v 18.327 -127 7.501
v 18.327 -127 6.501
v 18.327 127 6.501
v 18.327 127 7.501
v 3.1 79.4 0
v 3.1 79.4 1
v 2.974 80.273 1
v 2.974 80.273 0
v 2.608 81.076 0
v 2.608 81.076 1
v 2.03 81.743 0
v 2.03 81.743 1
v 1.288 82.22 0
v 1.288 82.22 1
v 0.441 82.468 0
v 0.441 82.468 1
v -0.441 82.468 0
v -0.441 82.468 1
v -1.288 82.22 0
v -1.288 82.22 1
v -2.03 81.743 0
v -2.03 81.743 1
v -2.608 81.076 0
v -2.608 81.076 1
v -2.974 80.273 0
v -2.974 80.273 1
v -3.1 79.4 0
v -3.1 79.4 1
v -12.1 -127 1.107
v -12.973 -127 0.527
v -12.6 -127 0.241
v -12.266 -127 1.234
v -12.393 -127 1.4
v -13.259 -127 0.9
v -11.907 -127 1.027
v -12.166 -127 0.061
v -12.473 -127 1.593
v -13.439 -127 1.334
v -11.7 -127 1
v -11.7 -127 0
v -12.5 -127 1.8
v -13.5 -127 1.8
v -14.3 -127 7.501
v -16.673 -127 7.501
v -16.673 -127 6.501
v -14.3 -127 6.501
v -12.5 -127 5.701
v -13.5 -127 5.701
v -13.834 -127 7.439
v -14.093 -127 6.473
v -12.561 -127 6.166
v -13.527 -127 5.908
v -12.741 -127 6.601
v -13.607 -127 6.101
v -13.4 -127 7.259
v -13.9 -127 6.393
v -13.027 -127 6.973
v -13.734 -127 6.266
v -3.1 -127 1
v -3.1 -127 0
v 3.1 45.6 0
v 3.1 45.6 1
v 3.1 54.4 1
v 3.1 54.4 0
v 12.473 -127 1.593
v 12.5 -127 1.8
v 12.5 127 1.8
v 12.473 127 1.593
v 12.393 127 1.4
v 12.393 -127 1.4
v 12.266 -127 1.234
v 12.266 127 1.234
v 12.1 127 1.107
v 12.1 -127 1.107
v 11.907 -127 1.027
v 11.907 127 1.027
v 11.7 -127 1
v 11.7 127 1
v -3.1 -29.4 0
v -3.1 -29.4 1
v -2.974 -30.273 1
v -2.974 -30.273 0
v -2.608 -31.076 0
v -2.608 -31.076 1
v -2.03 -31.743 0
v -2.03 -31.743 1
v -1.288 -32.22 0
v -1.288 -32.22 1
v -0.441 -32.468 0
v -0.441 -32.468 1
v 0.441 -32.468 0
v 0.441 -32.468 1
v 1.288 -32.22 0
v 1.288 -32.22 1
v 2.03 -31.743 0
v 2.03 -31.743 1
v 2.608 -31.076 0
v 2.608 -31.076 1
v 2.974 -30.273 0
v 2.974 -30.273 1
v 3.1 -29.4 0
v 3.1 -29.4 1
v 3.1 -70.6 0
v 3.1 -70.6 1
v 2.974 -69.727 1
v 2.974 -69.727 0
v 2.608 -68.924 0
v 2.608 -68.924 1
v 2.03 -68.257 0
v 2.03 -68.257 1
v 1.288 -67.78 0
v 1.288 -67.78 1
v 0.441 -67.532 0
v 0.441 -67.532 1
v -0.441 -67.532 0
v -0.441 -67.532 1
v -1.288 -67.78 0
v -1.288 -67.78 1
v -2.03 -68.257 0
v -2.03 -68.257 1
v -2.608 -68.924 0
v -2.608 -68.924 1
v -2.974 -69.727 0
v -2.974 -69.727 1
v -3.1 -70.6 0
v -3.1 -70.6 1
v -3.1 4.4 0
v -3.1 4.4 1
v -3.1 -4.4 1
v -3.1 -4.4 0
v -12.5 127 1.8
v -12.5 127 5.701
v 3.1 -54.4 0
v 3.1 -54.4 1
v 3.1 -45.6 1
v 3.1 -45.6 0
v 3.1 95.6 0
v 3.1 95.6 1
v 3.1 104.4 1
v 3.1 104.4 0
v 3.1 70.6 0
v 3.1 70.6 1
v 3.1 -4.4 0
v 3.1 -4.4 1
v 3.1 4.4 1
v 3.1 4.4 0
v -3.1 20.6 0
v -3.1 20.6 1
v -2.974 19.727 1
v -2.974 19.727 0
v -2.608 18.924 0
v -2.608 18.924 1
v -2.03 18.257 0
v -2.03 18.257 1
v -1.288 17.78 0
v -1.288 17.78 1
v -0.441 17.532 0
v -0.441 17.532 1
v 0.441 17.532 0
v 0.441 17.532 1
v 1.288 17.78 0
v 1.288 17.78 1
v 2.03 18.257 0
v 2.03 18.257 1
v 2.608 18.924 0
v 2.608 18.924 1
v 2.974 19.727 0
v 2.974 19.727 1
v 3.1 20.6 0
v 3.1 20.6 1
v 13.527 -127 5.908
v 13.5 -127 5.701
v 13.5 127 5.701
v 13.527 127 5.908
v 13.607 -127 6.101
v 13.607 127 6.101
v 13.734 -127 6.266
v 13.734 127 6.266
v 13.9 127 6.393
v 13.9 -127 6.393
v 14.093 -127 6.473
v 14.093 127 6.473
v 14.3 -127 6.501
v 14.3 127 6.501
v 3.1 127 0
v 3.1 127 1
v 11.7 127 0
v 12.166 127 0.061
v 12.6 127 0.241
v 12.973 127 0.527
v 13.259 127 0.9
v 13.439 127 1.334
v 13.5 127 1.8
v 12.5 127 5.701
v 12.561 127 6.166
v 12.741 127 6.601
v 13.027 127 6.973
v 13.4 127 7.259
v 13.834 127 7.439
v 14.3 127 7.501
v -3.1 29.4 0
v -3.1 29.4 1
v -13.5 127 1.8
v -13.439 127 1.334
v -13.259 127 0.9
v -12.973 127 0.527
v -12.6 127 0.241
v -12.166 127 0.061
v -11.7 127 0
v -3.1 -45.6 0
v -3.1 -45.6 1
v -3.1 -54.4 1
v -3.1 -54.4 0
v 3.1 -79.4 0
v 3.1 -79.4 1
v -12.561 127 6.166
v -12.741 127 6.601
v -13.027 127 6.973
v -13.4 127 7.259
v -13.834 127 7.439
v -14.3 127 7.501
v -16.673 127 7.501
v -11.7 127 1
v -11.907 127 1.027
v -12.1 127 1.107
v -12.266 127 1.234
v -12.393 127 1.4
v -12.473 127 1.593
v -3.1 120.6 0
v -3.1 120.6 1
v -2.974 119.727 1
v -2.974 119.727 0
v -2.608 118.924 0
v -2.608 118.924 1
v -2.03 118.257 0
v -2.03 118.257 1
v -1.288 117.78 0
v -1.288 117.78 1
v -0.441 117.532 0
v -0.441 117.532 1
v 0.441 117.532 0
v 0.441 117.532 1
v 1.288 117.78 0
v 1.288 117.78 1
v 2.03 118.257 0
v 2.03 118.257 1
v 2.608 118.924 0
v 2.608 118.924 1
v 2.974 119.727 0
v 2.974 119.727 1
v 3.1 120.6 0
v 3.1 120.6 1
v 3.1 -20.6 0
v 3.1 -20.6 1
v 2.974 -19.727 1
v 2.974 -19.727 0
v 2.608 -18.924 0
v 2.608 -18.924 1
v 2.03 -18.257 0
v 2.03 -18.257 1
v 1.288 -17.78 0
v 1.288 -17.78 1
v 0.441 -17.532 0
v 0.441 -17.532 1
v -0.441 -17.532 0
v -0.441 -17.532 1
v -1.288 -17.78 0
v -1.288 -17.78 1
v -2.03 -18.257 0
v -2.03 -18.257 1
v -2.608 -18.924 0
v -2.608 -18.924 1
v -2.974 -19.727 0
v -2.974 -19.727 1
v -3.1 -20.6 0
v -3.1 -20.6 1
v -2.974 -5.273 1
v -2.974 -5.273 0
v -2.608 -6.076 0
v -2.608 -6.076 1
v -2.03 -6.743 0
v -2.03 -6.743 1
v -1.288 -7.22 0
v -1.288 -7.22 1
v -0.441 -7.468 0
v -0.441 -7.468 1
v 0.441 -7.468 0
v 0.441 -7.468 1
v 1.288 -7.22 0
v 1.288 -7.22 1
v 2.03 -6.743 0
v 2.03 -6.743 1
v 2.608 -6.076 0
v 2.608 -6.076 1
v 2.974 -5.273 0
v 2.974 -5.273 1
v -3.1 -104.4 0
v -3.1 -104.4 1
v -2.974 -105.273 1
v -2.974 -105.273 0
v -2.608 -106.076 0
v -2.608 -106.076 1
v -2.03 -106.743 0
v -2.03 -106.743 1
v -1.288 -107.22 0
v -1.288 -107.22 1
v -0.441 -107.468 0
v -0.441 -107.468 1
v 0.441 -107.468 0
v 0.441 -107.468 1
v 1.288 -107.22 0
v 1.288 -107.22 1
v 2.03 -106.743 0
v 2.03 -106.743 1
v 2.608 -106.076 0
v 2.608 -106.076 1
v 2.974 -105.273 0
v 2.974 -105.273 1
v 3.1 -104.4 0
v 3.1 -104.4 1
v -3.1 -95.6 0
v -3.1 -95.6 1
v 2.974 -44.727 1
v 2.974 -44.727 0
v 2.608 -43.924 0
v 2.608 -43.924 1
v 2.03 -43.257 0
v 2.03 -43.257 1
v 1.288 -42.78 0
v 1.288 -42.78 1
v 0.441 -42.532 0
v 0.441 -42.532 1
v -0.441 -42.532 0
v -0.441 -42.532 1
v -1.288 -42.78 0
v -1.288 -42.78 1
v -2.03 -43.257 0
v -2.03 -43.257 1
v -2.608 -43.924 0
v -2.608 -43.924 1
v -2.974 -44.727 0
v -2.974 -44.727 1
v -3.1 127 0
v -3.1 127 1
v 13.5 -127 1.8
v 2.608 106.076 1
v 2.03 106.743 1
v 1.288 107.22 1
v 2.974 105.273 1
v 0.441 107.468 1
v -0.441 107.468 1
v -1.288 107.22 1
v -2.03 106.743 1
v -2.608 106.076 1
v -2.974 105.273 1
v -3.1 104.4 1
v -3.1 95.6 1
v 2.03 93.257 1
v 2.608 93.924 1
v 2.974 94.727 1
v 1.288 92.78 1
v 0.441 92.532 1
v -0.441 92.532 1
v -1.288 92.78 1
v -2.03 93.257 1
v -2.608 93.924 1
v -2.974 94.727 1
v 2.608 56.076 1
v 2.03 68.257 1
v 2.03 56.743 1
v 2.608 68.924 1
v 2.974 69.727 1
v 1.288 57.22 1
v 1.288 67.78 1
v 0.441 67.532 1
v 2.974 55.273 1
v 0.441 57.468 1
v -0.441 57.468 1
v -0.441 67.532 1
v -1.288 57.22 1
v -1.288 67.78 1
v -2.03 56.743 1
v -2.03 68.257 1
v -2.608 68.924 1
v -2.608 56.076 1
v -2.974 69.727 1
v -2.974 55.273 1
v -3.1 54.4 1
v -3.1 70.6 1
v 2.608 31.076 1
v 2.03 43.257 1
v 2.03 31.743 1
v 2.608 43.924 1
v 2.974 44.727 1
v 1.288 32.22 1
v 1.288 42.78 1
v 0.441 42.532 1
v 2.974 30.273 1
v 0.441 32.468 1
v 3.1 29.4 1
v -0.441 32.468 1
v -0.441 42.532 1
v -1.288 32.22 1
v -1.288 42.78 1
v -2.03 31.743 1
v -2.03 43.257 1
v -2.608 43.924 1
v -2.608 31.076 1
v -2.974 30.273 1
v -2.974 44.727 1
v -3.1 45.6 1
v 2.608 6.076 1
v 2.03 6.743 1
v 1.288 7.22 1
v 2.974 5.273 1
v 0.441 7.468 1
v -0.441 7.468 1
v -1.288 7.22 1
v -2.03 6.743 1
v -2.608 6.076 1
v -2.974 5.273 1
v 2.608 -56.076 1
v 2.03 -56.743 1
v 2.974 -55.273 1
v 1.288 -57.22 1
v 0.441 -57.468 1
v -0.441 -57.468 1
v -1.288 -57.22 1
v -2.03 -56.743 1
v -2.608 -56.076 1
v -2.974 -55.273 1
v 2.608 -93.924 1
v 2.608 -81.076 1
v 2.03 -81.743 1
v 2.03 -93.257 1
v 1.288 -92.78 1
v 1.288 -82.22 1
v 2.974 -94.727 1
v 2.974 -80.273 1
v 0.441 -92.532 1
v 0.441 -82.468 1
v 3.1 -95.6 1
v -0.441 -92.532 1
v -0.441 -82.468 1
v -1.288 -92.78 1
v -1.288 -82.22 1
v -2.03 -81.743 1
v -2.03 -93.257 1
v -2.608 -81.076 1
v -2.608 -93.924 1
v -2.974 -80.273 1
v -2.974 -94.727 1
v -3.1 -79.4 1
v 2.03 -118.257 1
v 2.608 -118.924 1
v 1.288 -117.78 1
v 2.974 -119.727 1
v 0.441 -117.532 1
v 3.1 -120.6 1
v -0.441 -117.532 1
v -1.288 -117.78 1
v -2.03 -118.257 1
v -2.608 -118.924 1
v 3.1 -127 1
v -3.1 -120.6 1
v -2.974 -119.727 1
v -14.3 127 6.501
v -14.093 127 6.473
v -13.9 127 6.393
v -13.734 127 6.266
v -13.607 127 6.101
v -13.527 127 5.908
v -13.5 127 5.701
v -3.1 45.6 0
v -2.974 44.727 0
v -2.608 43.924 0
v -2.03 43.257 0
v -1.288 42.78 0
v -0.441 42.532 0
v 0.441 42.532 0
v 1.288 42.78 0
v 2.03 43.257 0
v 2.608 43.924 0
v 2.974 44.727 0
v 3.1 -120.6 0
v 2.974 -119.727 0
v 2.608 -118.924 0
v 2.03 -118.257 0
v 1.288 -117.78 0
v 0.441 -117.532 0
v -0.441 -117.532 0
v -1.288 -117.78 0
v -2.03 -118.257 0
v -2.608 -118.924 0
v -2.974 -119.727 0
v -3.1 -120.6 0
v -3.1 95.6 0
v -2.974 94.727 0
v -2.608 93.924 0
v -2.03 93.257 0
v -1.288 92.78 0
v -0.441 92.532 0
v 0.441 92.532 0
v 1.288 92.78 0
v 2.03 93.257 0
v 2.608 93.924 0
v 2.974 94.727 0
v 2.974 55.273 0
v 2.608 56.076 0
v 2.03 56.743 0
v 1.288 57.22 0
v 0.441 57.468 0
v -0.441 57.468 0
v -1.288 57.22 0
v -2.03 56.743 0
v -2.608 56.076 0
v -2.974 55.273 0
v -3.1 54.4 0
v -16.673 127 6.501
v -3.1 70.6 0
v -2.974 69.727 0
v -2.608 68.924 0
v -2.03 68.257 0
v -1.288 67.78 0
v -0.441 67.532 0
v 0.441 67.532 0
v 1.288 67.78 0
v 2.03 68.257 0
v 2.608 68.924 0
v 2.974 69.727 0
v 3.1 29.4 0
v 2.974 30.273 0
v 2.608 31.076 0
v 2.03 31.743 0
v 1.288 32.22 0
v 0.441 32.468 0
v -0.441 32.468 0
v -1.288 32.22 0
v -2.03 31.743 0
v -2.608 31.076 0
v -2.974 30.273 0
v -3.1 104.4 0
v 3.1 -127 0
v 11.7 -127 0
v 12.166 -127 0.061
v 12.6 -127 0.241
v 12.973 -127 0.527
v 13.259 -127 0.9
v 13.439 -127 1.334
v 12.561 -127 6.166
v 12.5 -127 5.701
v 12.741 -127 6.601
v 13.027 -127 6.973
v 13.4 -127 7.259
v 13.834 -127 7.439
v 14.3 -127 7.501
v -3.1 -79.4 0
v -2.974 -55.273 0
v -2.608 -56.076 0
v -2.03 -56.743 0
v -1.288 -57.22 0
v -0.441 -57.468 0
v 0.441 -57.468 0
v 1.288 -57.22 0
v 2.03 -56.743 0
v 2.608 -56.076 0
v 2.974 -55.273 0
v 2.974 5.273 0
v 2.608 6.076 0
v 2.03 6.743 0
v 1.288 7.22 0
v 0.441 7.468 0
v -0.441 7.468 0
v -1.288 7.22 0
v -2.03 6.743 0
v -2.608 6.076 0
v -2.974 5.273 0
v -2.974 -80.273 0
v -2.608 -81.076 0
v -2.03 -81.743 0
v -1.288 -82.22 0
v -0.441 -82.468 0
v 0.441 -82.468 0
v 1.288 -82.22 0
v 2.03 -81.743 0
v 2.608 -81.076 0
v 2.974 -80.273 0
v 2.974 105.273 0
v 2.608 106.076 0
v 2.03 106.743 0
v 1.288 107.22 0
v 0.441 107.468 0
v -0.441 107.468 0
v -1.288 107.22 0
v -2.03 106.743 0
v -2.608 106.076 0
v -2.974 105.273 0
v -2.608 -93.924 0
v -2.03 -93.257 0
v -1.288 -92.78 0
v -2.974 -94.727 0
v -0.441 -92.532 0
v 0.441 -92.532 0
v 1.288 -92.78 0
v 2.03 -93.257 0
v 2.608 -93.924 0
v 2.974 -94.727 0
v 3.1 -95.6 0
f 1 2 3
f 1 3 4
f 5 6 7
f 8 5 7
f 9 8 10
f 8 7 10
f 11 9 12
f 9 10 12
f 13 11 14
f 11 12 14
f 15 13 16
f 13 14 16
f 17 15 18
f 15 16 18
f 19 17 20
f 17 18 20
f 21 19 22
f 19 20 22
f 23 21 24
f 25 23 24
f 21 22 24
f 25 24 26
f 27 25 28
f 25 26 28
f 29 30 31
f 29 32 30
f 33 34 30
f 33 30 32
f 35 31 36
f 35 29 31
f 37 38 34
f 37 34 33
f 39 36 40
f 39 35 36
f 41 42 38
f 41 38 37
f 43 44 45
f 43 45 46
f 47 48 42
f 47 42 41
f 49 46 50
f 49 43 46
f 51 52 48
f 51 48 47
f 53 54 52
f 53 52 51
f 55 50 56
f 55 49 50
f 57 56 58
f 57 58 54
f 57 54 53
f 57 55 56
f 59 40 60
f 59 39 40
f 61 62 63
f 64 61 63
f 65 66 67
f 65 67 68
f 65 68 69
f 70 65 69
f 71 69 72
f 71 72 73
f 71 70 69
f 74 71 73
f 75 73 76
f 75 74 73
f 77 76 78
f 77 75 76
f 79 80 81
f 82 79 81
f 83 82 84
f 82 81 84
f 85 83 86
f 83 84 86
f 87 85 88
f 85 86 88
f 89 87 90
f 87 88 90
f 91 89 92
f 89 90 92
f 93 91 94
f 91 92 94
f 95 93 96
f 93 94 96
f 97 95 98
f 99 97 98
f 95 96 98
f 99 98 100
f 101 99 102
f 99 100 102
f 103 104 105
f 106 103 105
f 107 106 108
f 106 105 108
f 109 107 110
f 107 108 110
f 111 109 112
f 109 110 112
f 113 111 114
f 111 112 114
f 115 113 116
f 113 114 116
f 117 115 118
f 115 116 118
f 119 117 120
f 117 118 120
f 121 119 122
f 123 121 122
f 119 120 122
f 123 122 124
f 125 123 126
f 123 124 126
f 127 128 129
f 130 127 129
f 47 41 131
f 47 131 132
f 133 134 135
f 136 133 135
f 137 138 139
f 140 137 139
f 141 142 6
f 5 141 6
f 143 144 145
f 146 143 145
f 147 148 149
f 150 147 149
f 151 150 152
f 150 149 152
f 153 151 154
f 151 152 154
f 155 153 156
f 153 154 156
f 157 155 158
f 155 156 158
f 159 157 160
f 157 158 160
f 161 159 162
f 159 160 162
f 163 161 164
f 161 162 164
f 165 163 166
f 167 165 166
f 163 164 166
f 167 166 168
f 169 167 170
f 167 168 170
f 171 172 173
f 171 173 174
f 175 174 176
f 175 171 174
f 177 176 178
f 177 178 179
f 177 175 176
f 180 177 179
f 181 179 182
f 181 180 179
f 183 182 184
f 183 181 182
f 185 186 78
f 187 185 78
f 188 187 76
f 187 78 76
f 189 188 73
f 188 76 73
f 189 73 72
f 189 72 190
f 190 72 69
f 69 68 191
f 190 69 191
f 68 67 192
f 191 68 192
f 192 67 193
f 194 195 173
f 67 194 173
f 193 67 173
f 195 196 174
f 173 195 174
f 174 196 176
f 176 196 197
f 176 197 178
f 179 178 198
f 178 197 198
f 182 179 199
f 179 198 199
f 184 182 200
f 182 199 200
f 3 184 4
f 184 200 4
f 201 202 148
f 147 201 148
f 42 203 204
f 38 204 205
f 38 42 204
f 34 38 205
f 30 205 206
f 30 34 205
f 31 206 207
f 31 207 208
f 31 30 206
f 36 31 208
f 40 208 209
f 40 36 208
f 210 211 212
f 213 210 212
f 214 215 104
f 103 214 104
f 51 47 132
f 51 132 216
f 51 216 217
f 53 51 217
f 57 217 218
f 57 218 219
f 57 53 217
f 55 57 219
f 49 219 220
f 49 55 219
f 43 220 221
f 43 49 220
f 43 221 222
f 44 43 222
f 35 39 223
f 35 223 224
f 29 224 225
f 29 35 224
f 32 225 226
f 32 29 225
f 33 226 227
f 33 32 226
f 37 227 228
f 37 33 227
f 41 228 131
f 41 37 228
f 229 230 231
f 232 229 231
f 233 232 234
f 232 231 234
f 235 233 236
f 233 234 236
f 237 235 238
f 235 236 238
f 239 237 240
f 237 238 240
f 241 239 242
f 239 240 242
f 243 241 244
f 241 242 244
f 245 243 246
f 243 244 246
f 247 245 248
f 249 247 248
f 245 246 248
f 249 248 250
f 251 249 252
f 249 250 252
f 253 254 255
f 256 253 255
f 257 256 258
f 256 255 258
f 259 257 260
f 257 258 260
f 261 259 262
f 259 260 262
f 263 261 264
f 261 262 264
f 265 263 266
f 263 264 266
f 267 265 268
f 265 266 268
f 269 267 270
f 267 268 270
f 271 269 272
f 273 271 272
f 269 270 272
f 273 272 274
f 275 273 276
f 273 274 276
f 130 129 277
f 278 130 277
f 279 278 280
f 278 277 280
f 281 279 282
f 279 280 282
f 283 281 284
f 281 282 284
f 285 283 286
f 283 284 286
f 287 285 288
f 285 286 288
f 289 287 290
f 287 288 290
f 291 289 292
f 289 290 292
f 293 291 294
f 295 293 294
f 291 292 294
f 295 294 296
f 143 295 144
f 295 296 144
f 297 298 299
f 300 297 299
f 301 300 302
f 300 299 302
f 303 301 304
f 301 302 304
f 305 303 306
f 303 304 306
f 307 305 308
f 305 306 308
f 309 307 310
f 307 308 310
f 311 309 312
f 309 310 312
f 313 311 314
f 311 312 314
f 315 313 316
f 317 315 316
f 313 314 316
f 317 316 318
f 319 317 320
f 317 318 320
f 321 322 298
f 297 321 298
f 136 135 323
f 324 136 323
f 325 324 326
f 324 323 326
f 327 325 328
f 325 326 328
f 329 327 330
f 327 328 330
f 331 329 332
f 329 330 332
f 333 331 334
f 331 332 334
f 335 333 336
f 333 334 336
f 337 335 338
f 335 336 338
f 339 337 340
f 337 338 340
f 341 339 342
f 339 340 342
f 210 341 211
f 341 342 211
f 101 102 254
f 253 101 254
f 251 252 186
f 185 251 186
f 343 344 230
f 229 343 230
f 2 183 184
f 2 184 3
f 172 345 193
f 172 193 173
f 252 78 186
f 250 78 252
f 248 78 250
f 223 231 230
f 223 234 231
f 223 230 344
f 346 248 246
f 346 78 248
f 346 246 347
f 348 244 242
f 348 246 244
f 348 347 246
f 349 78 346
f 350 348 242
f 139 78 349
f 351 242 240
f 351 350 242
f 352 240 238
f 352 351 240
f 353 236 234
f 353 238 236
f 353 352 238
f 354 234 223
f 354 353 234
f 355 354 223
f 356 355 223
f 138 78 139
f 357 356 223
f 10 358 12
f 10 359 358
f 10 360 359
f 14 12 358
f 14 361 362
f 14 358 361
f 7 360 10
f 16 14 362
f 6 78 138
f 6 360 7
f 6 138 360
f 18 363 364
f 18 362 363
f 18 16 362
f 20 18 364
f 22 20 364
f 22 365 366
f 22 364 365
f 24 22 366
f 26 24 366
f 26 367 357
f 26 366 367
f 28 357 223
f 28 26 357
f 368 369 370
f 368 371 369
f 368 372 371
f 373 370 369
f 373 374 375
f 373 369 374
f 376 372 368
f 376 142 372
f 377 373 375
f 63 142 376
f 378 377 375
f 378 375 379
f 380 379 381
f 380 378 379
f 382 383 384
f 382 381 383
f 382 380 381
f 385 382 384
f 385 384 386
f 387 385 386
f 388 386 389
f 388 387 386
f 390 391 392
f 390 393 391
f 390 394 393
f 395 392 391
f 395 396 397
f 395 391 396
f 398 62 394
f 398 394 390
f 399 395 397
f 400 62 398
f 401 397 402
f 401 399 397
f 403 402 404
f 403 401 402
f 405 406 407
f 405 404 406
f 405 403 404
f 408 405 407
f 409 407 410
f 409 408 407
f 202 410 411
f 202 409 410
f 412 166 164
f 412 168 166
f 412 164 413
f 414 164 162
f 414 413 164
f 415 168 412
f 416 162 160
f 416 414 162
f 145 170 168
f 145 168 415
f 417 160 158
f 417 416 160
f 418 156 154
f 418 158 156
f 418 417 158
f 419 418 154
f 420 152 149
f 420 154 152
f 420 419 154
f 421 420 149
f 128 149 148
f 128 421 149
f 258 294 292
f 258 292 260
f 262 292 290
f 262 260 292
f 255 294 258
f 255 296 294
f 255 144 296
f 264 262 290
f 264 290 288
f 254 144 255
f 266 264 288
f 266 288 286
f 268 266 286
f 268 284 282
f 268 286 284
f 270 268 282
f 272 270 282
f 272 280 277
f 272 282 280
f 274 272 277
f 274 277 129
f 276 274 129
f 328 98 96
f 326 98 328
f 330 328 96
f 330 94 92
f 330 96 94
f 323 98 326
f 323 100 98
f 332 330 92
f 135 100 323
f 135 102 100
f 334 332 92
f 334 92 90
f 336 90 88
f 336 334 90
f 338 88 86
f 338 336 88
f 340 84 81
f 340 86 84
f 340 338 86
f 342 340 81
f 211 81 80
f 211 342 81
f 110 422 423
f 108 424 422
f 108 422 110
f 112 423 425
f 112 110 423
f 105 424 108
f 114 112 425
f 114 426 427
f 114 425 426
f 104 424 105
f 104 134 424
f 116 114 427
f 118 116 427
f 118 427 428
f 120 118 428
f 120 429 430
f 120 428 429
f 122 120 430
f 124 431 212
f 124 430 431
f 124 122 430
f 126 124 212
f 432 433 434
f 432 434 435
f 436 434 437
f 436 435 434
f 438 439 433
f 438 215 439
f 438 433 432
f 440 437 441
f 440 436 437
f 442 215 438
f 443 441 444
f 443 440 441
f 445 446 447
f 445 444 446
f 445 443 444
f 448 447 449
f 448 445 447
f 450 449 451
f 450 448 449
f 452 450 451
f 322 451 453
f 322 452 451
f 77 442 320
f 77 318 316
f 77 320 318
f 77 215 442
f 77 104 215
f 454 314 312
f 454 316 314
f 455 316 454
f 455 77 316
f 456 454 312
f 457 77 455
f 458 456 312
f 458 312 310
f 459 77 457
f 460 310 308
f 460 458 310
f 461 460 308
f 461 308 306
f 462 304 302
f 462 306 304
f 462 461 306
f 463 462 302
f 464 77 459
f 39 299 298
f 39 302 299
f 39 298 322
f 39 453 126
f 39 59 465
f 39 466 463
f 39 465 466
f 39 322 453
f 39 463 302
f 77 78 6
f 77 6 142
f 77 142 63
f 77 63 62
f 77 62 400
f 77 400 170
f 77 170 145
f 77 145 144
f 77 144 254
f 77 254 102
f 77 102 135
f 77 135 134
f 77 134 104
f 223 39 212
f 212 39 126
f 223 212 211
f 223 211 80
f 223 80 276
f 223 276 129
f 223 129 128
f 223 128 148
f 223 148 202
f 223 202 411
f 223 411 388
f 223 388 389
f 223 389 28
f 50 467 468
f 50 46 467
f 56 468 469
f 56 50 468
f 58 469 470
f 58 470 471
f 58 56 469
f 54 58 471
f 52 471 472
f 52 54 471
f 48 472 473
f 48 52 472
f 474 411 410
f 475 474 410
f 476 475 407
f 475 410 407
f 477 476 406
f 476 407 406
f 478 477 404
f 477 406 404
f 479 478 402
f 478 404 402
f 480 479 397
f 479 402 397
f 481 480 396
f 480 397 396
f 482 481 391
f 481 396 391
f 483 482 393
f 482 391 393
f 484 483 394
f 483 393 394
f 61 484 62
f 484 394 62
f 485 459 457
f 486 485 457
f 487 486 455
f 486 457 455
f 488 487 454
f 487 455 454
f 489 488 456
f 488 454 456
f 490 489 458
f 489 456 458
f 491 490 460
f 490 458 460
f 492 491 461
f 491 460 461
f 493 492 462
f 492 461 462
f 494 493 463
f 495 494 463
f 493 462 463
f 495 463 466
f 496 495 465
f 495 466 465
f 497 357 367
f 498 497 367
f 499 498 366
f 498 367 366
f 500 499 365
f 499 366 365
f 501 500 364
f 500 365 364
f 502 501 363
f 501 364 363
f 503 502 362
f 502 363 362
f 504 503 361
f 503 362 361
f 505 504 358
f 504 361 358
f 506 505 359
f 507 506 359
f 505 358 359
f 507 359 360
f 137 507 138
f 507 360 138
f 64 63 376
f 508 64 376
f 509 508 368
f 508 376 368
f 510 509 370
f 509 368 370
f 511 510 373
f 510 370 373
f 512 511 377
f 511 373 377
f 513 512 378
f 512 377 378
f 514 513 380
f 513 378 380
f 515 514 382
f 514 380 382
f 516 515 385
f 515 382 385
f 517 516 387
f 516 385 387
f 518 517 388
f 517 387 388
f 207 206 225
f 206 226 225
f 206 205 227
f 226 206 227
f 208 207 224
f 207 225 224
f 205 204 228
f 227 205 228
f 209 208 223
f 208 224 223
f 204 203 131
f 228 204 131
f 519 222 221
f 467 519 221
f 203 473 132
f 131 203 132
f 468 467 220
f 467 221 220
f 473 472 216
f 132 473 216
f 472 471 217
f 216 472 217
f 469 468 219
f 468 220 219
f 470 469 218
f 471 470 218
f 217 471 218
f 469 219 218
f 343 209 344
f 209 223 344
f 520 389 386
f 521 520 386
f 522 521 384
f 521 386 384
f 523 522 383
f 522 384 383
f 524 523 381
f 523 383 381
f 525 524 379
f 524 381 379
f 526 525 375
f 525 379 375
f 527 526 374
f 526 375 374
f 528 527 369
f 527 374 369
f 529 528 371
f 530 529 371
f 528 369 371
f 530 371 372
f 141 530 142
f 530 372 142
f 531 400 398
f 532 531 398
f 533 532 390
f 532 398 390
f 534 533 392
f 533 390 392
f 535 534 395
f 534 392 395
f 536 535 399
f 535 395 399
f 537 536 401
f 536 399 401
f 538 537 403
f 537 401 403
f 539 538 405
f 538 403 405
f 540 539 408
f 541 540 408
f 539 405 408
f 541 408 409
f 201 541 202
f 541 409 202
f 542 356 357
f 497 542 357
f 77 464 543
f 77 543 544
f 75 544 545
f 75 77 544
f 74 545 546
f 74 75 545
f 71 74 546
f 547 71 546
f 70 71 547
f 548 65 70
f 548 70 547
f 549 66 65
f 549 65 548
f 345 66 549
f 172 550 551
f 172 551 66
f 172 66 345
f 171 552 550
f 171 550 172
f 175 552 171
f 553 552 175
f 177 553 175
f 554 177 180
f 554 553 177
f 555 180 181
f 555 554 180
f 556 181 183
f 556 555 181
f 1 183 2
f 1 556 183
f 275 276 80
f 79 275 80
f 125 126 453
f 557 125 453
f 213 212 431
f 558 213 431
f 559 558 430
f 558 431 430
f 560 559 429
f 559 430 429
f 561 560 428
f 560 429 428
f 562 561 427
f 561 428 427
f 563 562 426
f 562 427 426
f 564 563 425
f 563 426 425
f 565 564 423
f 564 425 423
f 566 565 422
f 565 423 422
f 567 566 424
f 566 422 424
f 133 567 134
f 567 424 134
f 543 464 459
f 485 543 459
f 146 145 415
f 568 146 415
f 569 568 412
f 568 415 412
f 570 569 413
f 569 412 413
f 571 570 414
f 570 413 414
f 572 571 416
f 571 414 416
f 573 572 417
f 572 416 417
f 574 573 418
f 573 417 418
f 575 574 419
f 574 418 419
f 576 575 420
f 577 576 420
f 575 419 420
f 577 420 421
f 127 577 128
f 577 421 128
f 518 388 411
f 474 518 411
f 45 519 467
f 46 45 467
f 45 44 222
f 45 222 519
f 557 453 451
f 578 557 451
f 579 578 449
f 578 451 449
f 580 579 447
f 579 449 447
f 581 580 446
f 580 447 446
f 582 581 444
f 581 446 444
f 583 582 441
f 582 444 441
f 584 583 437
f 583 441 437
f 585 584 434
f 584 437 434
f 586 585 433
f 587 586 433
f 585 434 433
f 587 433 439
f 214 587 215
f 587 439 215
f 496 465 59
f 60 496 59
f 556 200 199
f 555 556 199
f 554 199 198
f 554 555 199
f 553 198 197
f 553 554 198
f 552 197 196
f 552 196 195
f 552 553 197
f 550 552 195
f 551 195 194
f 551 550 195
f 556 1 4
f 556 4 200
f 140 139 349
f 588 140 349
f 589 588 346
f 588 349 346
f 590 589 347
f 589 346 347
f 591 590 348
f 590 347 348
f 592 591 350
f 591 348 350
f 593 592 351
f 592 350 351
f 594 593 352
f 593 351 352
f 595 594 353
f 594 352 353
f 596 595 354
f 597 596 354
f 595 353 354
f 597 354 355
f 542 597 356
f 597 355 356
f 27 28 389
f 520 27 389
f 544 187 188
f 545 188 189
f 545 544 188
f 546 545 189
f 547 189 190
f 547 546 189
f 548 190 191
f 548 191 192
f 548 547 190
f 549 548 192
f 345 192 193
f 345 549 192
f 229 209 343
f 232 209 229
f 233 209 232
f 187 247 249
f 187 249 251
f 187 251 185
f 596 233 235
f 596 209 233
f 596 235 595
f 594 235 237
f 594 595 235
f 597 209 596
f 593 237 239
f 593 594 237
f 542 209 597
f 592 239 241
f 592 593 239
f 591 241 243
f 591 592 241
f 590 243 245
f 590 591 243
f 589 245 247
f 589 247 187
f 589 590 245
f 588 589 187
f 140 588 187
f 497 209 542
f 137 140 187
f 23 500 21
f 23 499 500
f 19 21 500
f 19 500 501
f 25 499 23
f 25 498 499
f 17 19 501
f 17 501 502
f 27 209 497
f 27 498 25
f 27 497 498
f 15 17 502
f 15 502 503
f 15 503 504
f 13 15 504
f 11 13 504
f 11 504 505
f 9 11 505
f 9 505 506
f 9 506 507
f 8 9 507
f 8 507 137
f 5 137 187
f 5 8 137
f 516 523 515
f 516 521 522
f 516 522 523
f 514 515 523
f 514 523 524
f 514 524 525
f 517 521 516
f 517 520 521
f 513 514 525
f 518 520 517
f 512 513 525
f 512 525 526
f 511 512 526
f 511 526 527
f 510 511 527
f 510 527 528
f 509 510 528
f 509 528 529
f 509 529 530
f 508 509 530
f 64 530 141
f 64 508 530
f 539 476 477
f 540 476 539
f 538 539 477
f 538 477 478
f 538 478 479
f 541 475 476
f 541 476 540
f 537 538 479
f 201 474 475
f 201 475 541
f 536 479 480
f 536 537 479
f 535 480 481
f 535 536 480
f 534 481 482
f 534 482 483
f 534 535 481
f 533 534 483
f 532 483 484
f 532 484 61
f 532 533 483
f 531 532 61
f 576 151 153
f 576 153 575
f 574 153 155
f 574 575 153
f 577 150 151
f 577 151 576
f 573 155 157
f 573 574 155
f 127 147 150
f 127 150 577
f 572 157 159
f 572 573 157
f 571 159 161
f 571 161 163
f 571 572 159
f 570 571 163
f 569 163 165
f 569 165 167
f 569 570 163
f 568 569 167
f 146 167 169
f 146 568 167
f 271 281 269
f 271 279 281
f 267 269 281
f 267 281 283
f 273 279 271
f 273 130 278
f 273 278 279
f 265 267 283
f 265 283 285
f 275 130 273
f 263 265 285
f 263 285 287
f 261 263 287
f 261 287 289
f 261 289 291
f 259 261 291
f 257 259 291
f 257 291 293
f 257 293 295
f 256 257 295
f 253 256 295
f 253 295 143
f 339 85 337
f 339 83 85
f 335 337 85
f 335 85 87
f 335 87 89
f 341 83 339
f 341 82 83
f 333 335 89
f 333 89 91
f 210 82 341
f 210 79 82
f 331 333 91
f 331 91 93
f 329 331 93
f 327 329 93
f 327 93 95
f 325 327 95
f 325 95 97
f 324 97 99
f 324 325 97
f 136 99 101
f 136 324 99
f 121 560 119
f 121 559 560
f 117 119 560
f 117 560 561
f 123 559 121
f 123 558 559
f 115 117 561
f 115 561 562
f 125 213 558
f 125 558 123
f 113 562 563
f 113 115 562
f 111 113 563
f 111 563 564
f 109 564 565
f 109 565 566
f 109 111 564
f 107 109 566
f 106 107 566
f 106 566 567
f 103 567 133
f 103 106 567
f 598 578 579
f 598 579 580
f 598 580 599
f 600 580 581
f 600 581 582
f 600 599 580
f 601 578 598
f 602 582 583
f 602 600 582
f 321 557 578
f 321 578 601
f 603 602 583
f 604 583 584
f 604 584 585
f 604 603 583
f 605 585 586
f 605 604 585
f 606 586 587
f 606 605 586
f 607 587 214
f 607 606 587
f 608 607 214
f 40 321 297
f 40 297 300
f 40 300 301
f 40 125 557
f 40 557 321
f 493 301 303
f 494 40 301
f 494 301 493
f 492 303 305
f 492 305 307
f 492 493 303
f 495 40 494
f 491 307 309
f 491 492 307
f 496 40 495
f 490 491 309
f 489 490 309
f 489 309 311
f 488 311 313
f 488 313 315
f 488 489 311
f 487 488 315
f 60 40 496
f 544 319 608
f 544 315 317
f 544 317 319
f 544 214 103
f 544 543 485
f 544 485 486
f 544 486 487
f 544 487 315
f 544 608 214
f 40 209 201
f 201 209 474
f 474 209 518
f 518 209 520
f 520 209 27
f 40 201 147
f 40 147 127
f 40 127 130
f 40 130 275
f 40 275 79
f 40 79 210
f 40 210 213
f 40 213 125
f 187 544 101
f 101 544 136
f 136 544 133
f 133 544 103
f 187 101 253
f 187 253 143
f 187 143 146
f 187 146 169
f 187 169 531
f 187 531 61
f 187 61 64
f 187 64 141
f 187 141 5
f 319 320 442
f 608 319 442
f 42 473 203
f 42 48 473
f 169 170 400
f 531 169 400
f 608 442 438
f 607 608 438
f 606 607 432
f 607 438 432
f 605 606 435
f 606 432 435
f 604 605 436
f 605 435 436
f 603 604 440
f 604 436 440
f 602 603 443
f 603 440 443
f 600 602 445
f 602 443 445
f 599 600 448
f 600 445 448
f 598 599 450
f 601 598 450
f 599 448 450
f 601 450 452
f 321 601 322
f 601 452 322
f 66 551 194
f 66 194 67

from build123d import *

# Parameters (mm, degrees)
F1_DEPTH = 127
F3_DEPTH = 1.001
F4_DEPTH = 1


# Not quite as in the source:
# - a feature names something its author has since deleted; it is built from what else it names


with BuildPart() as f1:
    # F0 (on Front) → F1 (new body, symmetric)
    with BuildSketch(Plane.XZ):
        with BuildLine():
            ThreePointArc((-13.5001, 1.8), (-12.9728922061, 0.5272077939), (-11.7001, 0))
            Line((-11.7001, 0), (11.7001, 0))
            ThreePointArc((11.7001, 0), (12.9728922061, 0.5272077939), (13.5001, 1.8))
            Line((13.5001, 1.8), (13.5001, 5.70062))
            ThreePointArc((13.5001, 5.70062), (13.7344145751, 6.2663054249), (14.3001, 6.50062))
            Line((14.3001, 6.50062), (18.3269093243, 6.50062))
            Line((18.3269093243, 6.50062), (18.3269093243, 7.50062))
            Line((18.3269093243, 7.50062), (14.2999, 7.50062))
            ThreePointArc((14.2999, 7.50062), (13.0271077939, 6.9734122061), (12.4999, 5.70062))
            Line((12.4999, 5.70062), (12.4999, 1.8))
            ThreePointArc((12.4999, 1.8), (12.2655854249, 1.2343145751), (11.6999, 1))
            Line((11.6999, 1), (-11.7001, 1))
            ThreePointArc((-11.7001, 1), (-12.2657854249, 1.2343145751), (-12.5001, 1.8))
            Line((-12.5001, 1.8), (-12.5001, 5.70062))
            ThreePointArc((-12.5001, 5.70062), (-13.0273077939, 6.9734122061), (-14.3001, 7.50062))
            Line((-14.3001, 7.50062), (-16.6730906757, 7.50062))
            Line((-16.6730906757, 7.50062), (-16.6730906757, 6.50062))
            Line((-16.6730906757, 6.50062), (-14.3001, 6.50062))
            ThreePointArc((-14.3001, 6.50062), (-13.7344145751, 6.2663054249), (-13.5001, 5.70062))
            Line((-13.5001, 5.70062), (-13.5001, 1.8))
        make_face()
    extrude(amount=F1_DEPTH, both=True)

    # F2 (on face) → F3 (cut, through all)
    with BuildSketch(Plane.XY.offset(1)):
        with BuildLine():
            ThreePointArc((-3.1, -4.4), (0, -7.5), (3.1, -4.4))
            Line((3.1, -4.4), (3.1, 4.4))
            ThreePointArc((3.1, 4.4), (0, 7.5), (-3.1, 4.4))
            Line((-3.1, 4.4), (-3.1, -4.4))
        make_face()
        with BuildLine():
            ThreePointArc((-3.1, 20.6), (0, 17.5), (3.1, 20.6))
            Line((3.1, 20.6), (3.1, 29.4))
            ThreePointArc((3.1, 29.4), (0, 32.5), (-3.1, 29.4))
            Line((-3.1, 29.4), (-3.1, 20.6))
        make_face()
        with BuildLine():
            ThreePointArc((-3.1, 45.6), (0, 42.5), (3.1, 45.6))
            Line((3.1, 45.6), (3.1, 54.4))
            ThreePointArc((3.1, 54.4), (0, 57.5), (-3.1, 54.4))
            Line((-3.1, 54.4), (-3.1, 45.6))
        make_face()
        with BuildLine():
            ThreePointArc((-3.1, 70.6), (0, 67.5), (3.1, 70.6))
            Line((3.1, 70.6), (3.1, 79.4))
            ThreePointArc((3.1, 79.4), (0, 82.5), (-3.1, 79.4))
            Line((-3.1, 79.4), (-3.1, 70.6))
        make_face()
        with BuildLine():
            ThreePointArc((-3.1, 95.6), (0, 92.5), (3.1, 95.6))
            Line((3.1, 95.6), (3.1, 104.4))
            ThreePointArc((3.1, 104.4), (0, 107.5), (-3.1, 104.4))
            Line((-3.1, 104.4), (-3.1, 95.6))
        make_face()
        with BuildLine():
            ThreePointArc((-3.1, 120.6), (0, 117.5), (3.1, 120.6))
            Line((3.1, 120.6), (3.1, 129.4))
            ThreePointArc((3.1, 129.4), (0, 132.5), (-3.1, 129.4))
            Line((-3.1, 129.4), (-3.1, 120.6))
        make_face()
        with BuildLine():
            ThreePointArc((-3.1, -29.4), (0, -32.5), (3.1, -29.4))
            Line((3.1, -29.4), (3.1, -20.6))
            ThreePointArc((3.1, -20.6), (0, -17.5), (-3.1, -20.6))
            Line((-3.1, -20.6), (-3.1, -29.4))
        make_face()
        with BuildLine():
            ThreePointArc((3.1, -45.6), (0, -42.5), (-3.1, -45.6))
            Line((-3.1, -45.6), (-3.1, -54.4))
            ThreePointArc((-3.1, -54.4), (0, -57.5), (3.1, -54.4))
            Line((3.1, -54.4), (3.1, -45.6))
        make_face()
        with BuildLine():
            ThreePointArc((-3.1, -79.4), (0, -82.5), (3.1, -79.4))
            Line((3.1, -79.4), (3.1, -70.6))
            ThreePointArc((3.1, -70.6), (0, -67.5), (-3.1, -70.6))
            Line((-3.1, -70.6), (-3.1, -79.4))
        make_face()
        with BuildLine():
            ThreePointArc((3.1, -95.6), (0, -92.5), (-3.1, -95.6))
            Line((-3.1, -95.6), (-3.1, -104.4))
            ThreePointArc((-3.1, -104.4), (0, -107.5), (3.1, -104.4))
            Line((3.1, -104.4), (3.1, -95.6))
        make_face()
        with BuildLine():
            ThreePointArc((3.1, -120.6), (0, -117.5), (-3.1, -120.6))
            Line((-3.1, -120.6), (-3.1, -129.4))
            ThreePointArc((-3.1, -129.4), (0, -132.5), (3.1, -129.4))
            Line((3.1, -129.4), (3.1, -120.6))
        make_face()
    extrude(amount=-F3_DEPTH, mode=Mode.SUBTRACT)

    # F2 (on face) → F4 (cut, through all)
    with BuildSketch(Plane.XY.offset(1)):
        with BuildLine():
            ThreePointArc((-3.1, 95.6), (0, 92.5), (3.1, 95.6))
            Line((3.1, 95.6), (3.1, 104.4))
            ThreePointArc((3.1, 104.4), (0, 107.5), (-3.1, 104.4))
            Line((-3.1, 104.4), (-3.1, 95.6))
        make_face()
        with BuildLine():
            ThreePointArc((-3.1, 70.6), (0, 67.5), (3.1, 70.6))
            Line((3.1, 70.6), (3.1, 79.4))
            ThreePointArc((3.1, 79.4), (0, 82.5), (-3.1, 79.4))
            Line((-3.1, 79.4), (-3.1, 70.6))
        make_face()
        with BuildLine():
            ThreePointArc((-3.1, 45.6), (0, 42.5), (3.1, 45.6))
            Line((3.1, 45.6), (3.1, 54.4))
            ThreePointArc((3.1, 54.4), (0, 57.5), (-3.1, 54.4))
            Line((-3.1, 54.4), (-3.1, 45.6))
        make_face()
        with BuildLine():
            ThreePointArc((-3.1, 20.6), (0, 17.5), (3.1, 20.6))
            Line((3.1, 20.6), (3.1, 29.4))
            ThreePointArc((3.1, 29.4), (0, 32.5), (-3.1, 29.4))
            Line((-3.1, 29.4), (-3.1, 20.6))
        make_face()
        with BuildLine():
            ThreePointArc((-3.1, -4.4), (0, -7.5), (3.1, -4.4))
            Line((3.1, -4.4), (3.1, 4.4))
            ThreePointArc((3.1, 4.4), (0, 7.5), (-3.1, 4.4))
            Line((-3.1, 4.4), (-3.1, -4.4))
        make_face()
        with BuildLine():
            ThreePointArc((-3.1, 120.6), (0, 117.5), (3.1, 120.6))
            Line((3.1, 120.6), (3.1, 127))
            Line((3.1, 127), (-3.1, 127))
            Line((-3.1, 127), (-3.1, 120.6))
        make_face()
        with BuildLine():
            Line((-3.1, 127), (3.1, 127))
            Line((3.1, 127), (3.1, 129.4))
            ThreePointArc((3.1, 129.4), (0, 132.5), (-3.1, 129.4))
            Line((-3.1, 129.4), (-3.1, 127))
        make_face()
    extrude(amount=-F4_DEPTH, mode=Mode.SUBTRACT)


solid = f1.part
